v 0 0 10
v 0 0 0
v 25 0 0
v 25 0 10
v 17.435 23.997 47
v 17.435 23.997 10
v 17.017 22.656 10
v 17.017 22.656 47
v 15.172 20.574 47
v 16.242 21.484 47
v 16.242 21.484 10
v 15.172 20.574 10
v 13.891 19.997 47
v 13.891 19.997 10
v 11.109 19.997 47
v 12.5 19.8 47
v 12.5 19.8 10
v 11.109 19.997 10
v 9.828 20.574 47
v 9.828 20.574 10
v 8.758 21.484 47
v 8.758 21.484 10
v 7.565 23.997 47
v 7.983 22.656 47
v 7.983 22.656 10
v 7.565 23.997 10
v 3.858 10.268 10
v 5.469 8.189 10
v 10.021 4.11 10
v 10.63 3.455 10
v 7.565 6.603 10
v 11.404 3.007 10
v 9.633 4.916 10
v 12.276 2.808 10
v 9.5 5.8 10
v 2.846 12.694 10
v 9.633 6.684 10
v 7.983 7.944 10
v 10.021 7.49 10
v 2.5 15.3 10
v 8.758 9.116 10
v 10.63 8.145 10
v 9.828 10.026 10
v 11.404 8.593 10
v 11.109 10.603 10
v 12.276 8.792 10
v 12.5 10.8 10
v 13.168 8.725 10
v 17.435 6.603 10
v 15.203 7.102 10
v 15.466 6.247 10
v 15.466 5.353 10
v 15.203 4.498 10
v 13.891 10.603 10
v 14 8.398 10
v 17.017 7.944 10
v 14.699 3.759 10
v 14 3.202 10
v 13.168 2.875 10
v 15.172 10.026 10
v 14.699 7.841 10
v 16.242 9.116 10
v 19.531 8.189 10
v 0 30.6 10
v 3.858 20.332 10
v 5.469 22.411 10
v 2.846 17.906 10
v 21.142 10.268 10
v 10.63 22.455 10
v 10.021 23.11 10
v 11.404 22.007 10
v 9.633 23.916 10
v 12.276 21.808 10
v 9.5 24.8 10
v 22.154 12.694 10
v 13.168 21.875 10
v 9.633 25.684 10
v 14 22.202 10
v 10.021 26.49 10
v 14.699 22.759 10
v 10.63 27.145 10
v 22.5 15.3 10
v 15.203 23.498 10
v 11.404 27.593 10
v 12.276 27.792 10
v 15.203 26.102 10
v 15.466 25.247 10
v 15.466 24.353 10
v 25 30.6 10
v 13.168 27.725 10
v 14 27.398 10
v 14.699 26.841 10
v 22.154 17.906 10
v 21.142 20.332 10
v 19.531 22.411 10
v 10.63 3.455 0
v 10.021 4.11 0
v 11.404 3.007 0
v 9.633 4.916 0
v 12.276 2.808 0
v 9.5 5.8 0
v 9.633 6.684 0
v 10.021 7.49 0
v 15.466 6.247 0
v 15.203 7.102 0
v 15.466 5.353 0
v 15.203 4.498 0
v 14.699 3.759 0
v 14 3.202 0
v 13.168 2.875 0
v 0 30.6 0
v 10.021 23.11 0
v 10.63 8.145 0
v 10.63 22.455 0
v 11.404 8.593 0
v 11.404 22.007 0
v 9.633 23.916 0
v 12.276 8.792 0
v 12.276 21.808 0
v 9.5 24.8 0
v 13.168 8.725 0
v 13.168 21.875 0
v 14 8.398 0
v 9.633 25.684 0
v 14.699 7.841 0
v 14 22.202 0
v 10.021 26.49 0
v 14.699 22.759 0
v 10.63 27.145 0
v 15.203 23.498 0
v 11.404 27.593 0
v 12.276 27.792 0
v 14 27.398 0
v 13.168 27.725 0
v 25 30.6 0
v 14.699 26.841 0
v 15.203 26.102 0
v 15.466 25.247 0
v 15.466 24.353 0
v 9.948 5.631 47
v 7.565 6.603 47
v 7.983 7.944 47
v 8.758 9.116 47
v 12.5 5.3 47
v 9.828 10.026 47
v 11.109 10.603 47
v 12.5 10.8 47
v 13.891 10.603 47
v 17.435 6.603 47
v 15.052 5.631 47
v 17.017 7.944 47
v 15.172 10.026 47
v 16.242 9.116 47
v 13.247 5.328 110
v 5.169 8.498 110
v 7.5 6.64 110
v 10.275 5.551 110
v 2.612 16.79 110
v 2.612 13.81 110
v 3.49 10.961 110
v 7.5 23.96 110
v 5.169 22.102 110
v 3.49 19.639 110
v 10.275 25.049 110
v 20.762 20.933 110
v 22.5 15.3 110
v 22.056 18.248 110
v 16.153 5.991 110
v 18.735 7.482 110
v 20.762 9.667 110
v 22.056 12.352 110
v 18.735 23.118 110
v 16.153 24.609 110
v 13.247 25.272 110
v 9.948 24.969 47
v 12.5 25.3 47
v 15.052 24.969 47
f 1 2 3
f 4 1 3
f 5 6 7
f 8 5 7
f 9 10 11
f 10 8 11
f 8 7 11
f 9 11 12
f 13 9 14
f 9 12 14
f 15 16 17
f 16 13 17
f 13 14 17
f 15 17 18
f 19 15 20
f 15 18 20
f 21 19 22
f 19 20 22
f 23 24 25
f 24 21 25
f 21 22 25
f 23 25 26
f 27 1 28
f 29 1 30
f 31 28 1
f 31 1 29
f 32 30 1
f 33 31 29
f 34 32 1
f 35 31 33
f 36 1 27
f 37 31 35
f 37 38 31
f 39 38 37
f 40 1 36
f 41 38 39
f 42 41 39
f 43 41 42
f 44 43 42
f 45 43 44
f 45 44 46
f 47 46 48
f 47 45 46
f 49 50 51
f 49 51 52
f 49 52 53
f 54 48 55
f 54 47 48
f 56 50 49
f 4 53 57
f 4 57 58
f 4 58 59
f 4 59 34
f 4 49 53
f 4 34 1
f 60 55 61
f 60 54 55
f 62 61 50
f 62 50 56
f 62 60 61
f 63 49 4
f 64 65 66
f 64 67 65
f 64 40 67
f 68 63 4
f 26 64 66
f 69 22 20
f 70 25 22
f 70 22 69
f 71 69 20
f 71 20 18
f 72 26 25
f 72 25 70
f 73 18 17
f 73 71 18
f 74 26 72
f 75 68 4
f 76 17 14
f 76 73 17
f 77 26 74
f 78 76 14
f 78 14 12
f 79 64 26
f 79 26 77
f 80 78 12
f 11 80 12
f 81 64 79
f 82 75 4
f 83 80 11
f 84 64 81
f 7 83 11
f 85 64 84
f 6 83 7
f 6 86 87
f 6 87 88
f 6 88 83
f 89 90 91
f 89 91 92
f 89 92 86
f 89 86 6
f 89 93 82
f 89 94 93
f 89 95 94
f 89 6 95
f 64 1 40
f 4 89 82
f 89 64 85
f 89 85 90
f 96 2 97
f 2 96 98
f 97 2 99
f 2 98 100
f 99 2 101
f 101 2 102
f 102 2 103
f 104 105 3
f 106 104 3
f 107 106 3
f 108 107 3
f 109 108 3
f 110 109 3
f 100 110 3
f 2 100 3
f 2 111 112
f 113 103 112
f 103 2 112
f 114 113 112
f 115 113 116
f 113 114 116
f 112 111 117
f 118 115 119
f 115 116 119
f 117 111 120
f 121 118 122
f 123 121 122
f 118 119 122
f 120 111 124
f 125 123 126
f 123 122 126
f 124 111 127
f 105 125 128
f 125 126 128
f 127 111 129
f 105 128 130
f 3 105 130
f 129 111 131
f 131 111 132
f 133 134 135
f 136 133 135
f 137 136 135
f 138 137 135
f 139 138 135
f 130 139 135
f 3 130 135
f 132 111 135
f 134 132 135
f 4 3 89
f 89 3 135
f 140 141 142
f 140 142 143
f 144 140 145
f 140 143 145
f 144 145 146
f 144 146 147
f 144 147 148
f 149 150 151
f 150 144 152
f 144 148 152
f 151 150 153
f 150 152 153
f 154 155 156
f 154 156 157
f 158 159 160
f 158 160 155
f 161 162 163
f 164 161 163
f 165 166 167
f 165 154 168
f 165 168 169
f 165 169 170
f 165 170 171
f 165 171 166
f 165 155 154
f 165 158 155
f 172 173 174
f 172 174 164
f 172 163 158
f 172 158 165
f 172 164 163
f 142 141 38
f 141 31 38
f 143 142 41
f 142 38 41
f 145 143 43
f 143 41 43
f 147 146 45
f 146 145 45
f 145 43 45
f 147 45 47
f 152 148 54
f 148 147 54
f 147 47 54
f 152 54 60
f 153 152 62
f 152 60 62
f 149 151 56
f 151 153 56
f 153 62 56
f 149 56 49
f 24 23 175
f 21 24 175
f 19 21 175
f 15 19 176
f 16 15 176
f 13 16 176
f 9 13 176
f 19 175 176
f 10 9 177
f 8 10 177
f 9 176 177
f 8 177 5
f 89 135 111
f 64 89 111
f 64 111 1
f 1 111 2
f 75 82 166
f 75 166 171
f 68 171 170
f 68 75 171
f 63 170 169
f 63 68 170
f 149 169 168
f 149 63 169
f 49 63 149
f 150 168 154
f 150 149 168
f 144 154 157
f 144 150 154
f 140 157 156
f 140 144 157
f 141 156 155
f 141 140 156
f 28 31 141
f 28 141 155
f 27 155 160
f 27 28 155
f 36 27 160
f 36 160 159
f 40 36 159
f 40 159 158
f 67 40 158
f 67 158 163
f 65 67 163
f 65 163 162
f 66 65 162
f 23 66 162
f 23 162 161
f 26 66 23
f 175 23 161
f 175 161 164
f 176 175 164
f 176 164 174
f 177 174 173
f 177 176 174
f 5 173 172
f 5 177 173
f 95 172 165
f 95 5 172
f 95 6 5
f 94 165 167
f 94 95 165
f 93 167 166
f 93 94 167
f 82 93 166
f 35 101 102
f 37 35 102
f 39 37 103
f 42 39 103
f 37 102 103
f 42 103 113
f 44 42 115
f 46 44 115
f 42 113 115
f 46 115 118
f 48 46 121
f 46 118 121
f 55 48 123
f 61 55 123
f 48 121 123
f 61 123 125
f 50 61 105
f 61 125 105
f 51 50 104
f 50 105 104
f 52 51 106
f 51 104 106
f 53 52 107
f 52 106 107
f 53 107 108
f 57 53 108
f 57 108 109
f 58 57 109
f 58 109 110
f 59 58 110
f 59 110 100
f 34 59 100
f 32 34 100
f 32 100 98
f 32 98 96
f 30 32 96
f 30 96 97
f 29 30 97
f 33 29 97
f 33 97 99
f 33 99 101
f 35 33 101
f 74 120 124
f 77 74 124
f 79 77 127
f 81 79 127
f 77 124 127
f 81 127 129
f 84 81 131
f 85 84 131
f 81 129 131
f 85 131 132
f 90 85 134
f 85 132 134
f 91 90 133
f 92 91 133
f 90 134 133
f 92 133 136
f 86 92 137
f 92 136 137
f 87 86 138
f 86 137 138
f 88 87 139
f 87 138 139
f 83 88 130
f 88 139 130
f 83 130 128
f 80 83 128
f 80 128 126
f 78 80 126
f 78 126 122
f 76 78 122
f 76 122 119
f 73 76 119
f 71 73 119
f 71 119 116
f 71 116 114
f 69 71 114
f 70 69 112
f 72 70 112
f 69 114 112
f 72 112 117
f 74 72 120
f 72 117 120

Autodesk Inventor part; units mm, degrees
ref_plane "YZ Plane" through (0, 0, 0) normal (1, 0, 0) x (0, 1, 0)
ref_plane "XZ Plane" through (0, 0, 0) normal (0, 1, 0) x (-1, 0, 0)
ref_plane "XY Plane" through (0, 0, 0) normal (0, 0, 1) x (1, 0, 0)
sketch "Sketch1" plane through (0, 0, 0) normal (0, 0, 1) x (1, 0, 0)
  line L0 (0, 0) -> (25, 0)
  line L1 (25, 0) -> (25, 30.6)
  line L2 (25, 30.6) -> (0, 30.6)
  line L3 (0, 30.6) -> (0, 0)
  dimension "d0" = 25
  dimension "d1" = 30.6
extrude "Extrusion1" add sketch "Sketch1" along normal blind 10
sketch "Sketch2" plane through (0, 0, 10) normal (0, 0, 1) x (1, 0, 0)
  circle A0 centre (12.5, 15.3) radius 10
  line L0 (25, 0) -> (25, 30.6) projected
  line L1 (0, 0) -> (25, 0) projected
  dimension "d4" = 12.5
  dimension "d6" = 20
  dimension "d19" = 15.3
extrude "Extrusion2" add sketch "Sketch2" along normal blind 100
sketch "Sketch3" plane through (0, 0, 0) normal (0, 0, -1) x (-1, 0, 0)
  circle A0 centre (-12.5, 5.8) radius 3
  circle A1 centre (-12.5, 24.8) radius 3
  line L0 (0, 30.6) -> (0, 0) projected
  line L1 (0, 0) -> (-25, 0) projected
  point P0 (-12.5, 0)
  dimension "d9" = 6
  dimension "d10" = 6
  dimension "d11" = 12.5
  dimension "d12" = 12.5
  dimension "d13" = 19
  dimension "d14" = 5.8
extrude "Extrusion3" cut sketch "Sketch3" against normal blind 20
sketch "Sketch4" plane through (0, 0, 10) normal (0, 0, 1) x (1, 0, 0)
  arc A0 (9.5003, 5.7605) -> (15.4997, 5.7605) centre (12.5, 5.8) ccw projected
  circle A1 centre (12.5, 5.8) radius 5
  arc A2 (15.4997, 24.8395) -> (9.5003, 24.8395) centre (12.5, 24.8) ccw projected
  circle A3 centre (12.5, 24.8) radius 5
  point P0 (0, 0)
  dimension "d17" = 10
  dimension "d18" = 10
extrude "Extrusion4" cut sketch "Sketch4" along normal blind 37
properties part number "handle_vertical"
